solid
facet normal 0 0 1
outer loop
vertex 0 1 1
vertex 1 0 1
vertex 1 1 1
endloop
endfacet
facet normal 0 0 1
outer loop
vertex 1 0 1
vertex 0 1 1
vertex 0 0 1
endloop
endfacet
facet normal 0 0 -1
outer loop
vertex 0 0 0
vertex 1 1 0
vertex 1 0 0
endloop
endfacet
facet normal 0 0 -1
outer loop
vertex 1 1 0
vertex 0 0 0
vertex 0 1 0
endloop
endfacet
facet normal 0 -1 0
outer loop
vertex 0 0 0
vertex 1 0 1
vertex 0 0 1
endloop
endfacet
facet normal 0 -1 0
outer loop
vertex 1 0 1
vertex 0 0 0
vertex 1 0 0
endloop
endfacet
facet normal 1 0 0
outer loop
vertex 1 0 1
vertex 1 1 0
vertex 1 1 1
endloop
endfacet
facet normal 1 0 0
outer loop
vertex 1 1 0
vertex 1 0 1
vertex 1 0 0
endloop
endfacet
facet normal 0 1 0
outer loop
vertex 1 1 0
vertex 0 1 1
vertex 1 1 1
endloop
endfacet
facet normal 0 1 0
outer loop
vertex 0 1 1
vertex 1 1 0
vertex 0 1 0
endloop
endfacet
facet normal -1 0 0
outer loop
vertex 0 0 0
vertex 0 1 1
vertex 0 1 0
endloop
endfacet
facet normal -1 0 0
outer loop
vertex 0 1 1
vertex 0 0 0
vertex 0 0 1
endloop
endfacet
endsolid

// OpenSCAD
//Author: 
//Date: 
//Description: Lesson 1.0 Introduction to OpenSCAD

/* 
Helpful JAWS and Windows commands for text editing:
If JAWS stops reading try focusing the menu bar and then pressing escape or focusing the editor window
Move cursor by word: CTRL + LEFT/RIGHT ARROW key
Move cursor to start of line: HOME (FN + LEFT ARROW KEY on most laptops)
Move cursor to end of line: END (FN + RIGHT ARROW KEY on most laptops)
Move cursor to beginning of file: CTRL + END
Move cursor to end of file: CTRL + HOME
Select: HOLD SHIFT AND MOVE CURSOR
Change punctuation level: JAWS KEY + SHIFT + 2
Read all from cursor: JAWS KEY + A
Read Current line: JAWS KEY + UP ARROW
Temporarily increase/decrease voice rate: ALT + CTRL + PAGE UP/PAGE DOWN (fn key and up/ down arrow on most laptops)
Spell curent line: JAWS KEY + UP ARROW twice quickly
*/

/* 
Exploring the Menus
ALT will focus the menu bar
You can use first letter navigation to get to things quickly i.e. the layered key stroke ALT > w > e will bring you to the 
*/
 
//Your first shape preview it and then try the below preview keyboard commands
cube([1,1,1]);

//You can fit the shape to the whole preview window with the command control + shift + v (alt > v > view all)
//You can change the view projection using ctrl + 4 through 9
//Once completed comment out the code with a single line comment

//TO DO: Make a larger cube render it, export it as an stl, and 3D print it!
